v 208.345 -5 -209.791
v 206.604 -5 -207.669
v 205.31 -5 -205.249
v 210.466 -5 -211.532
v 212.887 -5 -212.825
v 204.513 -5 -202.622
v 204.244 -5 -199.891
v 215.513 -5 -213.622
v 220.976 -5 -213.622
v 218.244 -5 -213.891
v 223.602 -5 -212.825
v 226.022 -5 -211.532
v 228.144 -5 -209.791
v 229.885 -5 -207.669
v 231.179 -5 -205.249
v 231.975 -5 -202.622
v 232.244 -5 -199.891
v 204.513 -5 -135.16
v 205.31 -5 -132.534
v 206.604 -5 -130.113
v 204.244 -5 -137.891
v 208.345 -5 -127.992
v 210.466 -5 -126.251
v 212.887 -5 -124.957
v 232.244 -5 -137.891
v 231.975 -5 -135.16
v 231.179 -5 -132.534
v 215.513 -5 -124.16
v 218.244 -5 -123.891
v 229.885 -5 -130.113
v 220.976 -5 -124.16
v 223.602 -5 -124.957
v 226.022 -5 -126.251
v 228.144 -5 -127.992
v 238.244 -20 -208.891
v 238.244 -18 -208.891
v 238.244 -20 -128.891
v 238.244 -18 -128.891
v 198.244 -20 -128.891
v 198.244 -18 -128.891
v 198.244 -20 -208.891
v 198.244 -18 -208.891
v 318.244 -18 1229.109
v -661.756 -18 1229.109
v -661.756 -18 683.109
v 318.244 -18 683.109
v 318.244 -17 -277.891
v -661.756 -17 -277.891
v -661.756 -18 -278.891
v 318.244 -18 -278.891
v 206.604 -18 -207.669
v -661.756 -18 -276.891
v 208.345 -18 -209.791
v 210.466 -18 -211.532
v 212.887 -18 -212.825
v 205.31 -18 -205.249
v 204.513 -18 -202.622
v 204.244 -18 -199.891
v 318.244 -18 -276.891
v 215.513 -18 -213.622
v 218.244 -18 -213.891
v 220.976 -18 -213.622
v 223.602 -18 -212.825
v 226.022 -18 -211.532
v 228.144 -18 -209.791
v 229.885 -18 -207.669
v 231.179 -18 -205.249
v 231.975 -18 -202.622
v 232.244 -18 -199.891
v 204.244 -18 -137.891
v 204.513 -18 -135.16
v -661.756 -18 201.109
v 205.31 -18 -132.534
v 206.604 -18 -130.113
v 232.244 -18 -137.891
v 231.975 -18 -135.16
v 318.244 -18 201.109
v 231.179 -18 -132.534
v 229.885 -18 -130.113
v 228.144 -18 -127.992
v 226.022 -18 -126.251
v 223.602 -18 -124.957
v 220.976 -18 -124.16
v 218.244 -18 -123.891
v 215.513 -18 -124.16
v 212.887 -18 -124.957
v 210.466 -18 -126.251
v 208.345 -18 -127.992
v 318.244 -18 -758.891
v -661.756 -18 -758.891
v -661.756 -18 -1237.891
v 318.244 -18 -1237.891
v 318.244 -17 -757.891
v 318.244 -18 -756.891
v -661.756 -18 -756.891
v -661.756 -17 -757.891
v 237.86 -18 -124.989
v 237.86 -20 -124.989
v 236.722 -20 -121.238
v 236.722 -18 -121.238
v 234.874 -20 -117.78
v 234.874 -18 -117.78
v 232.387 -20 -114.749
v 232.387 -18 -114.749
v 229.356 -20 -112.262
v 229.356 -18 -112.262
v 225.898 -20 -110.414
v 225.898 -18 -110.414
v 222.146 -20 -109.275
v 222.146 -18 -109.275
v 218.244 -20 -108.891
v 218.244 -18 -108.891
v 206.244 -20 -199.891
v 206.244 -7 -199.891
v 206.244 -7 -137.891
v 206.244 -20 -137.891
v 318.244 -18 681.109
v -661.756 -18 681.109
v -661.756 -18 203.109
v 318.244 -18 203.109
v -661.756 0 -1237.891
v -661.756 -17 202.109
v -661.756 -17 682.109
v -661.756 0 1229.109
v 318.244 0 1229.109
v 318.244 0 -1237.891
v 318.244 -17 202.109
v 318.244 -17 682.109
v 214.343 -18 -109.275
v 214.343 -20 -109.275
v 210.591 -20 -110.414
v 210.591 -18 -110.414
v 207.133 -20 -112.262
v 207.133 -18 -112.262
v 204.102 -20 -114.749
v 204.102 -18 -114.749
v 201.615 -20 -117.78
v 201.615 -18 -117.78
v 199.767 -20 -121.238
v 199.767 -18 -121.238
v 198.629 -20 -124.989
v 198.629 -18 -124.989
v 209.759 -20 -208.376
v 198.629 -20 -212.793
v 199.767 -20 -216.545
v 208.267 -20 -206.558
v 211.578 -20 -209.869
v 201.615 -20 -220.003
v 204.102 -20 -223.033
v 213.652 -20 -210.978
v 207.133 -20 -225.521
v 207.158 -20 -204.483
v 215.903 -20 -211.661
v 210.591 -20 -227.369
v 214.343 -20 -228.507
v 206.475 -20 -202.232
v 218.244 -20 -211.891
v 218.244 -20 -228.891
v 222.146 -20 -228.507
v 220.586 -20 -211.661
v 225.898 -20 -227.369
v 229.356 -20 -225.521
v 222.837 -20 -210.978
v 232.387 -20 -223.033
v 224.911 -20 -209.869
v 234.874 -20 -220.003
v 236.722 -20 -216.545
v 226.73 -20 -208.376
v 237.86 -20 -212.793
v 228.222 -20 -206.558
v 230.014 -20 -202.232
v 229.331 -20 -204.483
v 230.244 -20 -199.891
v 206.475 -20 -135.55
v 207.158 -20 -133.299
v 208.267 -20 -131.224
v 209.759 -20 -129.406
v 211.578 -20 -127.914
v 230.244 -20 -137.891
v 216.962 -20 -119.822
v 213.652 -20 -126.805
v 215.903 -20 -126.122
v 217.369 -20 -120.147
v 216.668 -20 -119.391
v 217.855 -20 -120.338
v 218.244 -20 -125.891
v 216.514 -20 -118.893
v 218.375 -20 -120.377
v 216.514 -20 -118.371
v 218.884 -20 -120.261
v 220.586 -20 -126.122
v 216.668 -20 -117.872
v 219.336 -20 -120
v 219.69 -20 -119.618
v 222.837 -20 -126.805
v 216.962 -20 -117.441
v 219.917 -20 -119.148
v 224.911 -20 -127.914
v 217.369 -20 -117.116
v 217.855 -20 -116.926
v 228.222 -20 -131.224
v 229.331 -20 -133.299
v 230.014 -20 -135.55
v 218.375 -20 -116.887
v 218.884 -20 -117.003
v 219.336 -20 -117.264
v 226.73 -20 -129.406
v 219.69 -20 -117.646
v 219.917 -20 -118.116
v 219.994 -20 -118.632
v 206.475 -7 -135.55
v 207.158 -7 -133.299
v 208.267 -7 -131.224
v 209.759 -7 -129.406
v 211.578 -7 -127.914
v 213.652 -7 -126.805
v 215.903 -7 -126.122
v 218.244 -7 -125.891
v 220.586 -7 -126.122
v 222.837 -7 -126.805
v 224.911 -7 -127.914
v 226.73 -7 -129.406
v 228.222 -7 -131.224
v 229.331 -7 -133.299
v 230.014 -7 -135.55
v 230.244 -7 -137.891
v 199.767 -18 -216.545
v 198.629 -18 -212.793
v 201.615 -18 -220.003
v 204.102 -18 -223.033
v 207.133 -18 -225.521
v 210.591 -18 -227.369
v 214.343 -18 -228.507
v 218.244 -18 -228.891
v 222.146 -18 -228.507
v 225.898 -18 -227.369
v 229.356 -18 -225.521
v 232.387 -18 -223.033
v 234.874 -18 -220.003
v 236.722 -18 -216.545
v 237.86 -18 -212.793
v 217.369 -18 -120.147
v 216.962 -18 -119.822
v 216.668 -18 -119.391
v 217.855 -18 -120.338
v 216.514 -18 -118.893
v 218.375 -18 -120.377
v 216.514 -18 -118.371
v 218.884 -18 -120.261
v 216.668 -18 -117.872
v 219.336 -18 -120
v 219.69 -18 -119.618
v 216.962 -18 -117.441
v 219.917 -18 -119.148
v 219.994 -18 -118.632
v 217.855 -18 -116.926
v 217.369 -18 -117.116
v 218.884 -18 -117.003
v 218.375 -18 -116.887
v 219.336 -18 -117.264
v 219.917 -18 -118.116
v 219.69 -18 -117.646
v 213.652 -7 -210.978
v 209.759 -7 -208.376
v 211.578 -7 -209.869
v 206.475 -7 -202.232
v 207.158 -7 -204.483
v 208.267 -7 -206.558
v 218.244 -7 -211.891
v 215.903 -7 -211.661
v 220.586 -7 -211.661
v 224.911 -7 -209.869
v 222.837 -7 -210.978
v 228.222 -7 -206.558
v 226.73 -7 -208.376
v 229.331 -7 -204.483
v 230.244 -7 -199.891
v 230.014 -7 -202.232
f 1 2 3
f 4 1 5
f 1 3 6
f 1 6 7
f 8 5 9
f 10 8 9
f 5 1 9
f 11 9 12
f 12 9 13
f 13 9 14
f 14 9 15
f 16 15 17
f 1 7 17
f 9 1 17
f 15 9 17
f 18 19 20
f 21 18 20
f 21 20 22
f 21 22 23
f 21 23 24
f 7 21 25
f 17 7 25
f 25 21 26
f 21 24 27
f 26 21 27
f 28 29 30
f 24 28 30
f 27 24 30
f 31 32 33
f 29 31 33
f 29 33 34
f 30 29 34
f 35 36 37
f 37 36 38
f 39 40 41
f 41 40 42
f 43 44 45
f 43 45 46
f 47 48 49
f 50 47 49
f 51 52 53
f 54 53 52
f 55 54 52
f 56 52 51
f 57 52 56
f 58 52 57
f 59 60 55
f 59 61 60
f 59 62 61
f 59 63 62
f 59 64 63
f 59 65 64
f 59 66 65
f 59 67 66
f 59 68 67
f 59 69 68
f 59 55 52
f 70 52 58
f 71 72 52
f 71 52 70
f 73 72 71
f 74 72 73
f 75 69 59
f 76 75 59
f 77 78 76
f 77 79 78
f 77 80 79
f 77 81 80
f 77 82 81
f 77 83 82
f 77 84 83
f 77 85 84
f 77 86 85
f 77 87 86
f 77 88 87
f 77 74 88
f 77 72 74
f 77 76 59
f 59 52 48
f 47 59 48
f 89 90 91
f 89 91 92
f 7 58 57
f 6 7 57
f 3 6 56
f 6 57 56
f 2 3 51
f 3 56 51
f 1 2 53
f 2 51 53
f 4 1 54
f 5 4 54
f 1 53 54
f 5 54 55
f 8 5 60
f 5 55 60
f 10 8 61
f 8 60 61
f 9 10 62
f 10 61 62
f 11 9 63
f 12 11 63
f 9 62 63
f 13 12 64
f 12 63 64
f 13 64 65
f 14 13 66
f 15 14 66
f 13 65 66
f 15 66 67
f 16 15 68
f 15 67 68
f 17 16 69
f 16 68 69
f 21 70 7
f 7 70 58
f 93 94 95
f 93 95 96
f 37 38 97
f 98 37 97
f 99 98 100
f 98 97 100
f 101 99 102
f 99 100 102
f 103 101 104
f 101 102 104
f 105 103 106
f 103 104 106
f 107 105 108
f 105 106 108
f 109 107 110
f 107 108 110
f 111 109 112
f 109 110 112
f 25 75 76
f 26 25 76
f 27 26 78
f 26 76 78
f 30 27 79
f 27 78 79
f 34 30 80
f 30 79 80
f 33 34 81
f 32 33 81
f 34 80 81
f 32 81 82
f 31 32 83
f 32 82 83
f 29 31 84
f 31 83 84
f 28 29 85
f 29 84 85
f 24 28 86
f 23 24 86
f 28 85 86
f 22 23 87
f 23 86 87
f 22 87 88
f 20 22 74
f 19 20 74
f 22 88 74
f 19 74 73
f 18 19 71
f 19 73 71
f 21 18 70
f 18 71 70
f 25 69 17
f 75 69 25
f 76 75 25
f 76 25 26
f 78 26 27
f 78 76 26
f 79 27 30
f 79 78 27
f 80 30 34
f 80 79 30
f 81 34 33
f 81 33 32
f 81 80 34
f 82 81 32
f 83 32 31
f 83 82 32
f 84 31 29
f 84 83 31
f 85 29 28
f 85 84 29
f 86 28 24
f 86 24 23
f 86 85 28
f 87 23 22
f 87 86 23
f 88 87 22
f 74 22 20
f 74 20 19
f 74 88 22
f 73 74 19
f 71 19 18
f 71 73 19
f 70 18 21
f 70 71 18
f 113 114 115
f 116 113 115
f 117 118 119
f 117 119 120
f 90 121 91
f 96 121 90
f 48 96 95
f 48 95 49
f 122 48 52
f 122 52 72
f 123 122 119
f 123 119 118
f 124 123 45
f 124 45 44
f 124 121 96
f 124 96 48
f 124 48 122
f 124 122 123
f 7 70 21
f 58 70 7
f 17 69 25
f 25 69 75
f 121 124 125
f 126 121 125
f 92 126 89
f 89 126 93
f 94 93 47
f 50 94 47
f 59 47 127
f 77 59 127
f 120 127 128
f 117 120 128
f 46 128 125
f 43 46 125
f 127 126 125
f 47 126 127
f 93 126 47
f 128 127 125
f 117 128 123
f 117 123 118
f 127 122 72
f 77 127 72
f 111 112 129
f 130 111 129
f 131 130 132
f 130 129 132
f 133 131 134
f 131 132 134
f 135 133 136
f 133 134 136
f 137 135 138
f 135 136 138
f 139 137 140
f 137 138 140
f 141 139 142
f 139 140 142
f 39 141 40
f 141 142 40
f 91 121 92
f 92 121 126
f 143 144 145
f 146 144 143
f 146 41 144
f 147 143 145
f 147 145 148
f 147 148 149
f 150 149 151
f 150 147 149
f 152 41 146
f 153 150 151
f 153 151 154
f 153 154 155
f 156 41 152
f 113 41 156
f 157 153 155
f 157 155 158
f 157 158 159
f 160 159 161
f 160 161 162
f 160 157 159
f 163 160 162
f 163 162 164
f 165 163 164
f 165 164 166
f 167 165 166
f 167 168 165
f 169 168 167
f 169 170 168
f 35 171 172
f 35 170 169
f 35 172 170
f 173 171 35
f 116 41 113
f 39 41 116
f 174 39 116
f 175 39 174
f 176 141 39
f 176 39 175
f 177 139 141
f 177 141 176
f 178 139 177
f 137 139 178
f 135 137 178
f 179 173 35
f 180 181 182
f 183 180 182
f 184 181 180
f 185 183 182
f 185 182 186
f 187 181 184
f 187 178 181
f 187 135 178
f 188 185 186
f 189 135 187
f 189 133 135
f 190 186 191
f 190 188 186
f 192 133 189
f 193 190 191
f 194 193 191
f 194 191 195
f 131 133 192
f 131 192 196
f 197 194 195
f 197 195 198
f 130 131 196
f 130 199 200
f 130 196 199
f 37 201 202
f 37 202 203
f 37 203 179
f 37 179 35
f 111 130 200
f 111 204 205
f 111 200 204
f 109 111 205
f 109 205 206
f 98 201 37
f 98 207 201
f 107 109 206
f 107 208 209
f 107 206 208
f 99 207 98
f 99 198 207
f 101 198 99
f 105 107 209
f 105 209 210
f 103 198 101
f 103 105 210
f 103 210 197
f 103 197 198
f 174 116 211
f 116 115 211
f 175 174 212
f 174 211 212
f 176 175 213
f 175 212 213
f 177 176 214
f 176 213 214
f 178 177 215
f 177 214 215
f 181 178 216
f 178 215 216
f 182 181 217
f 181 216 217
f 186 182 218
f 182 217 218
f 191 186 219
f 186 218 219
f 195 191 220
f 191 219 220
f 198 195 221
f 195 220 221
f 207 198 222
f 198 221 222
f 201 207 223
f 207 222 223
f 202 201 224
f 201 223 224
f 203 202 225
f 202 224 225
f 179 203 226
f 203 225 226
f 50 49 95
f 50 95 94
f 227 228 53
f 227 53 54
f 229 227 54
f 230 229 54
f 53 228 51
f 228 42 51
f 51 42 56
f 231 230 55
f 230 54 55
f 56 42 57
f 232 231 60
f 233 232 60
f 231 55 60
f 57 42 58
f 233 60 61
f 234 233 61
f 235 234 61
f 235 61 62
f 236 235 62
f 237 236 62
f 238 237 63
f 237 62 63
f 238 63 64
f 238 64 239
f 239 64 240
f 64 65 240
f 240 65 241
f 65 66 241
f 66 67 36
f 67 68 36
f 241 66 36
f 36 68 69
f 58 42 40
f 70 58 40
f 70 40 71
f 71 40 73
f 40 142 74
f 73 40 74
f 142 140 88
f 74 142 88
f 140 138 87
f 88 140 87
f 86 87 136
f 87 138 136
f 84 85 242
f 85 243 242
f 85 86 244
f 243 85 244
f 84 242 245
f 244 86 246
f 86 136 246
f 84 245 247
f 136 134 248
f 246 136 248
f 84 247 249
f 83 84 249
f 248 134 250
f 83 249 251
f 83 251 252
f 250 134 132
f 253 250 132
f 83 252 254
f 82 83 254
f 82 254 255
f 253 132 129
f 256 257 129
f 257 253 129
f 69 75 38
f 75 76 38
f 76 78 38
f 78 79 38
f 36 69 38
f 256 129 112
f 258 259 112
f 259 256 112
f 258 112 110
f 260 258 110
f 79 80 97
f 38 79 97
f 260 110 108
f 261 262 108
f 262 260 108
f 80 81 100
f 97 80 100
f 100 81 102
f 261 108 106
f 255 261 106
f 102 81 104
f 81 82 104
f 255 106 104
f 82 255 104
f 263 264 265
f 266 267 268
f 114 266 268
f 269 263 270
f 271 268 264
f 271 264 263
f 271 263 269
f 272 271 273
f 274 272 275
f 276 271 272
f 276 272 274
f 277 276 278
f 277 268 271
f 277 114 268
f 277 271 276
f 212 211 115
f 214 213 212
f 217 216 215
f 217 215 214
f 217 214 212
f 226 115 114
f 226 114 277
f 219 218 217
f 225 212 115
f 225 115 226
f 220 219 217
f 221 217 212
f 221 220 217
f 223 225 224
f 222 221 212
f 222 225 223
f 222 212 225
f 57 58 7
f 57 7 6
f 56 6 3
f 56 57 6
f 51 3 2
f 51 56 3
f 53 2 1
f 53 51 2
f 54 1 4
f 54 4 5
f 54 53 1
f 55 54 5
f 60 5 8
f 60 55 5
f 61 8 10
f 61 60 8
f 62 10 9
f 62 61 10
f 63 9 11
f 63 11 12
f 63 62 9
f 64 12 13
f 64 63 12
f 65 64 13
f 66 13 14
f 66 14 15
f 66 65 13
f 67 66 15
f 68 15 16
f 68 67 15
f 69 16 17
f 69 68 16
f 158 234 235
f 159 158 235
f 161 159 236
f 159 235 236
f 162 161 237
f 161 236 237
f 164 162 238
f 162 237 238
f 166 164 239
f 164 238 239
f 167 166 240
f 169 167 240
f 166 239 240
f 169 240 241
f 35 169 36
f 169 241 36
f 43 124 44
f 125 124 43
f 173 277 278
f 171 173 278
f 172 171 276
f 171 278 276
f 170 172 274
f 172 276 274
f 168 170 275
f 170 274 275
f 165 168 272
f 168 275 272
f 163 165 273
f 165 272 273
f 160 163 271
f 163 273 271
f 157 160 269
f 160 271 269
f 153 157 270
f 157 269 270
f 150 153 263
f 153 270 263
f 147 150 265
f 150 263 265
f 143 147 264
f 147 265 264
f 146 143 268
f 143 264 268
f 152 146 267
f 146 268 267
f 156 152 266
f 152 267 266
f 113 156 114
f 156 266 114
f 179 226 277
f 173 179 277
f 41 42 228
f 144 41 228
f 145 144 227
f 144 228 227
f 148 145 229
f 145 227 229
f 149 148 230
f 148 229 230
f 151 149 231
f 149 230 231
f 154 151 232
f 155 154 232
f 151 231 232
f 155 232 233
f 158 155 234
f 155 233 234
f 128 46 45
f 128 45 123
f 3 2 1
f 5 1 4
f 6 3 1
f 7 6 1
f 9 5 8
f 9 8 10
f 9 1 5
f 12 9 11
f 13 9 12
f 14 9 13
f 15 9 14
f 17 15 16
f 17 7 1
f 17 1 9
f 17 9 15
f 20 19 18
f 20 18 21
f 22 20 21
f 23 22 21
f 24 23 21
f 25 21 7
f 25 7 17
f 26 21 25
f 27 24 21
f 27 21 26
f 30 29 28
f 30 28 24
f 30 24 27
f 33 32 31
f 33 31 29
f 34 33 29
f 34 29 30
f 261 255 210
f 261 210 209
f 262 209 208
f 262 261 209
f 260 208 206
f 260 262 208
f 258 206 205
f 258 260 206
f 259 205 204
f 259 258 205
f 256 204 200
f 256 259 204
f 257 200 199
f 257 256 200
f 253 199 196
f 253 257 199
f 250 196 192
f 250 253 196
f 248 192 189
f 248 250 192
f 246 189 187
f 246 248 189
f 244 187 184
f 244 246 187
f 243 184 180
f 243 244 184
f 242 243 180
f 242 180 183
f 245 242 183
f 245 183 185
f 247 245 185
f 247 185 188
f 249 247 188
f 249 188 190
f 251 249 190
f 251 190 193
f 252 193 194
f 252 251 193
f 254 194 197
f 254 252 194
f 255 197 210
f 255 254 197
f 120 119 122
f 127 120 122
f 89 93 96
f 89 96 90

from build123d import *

# Parameters (mm, degrees)
F0_W     = 980
F0_H     = 2467
F1_DEPTH = 18
F3_DEPTH = 980.001
F5_DEPTH = 13
F6_DEPTH = 13
F7_START = -11
F7_DEPTH = 2
F4_R     = 1.75
F8_DEPTH = 2


with BuildPart() as f1:
    # F0 (on Front) → F1 (new body)
    with BuildSketch(Plane.XZ):
        with Locations((-171.7555719672, -4.3911735862)):
            Rectangle(F0_W, F0_H)
    extrude(amount=F1_DEPTH)

    # F2 (on face) → F3 (cut, through all)
    with BuildSketch(Plane(origin=(-661.7555719672, 0, 0), x_dir=(0, -1, 0), z_dir=(-1, 0, 0))):
        Polygon((18, -757.8911735862), (18, -756.8911735862), (17, -757.8911735862), (18, -758.8911735862), align=None)
        Polygon((18, 682.1088264138), (18, 683.1088264138), (17, 682.1088264138), (18, 681.1088264138), align=None)
        Polygon((17, -277.8911735862), (18, -278.8911735862), (18, -277.8911735862), (18, -276.8911735862), align=None)
        Polygon((17, 202.1088264138), (18, 201.1088264138), (18, 202.1088264138), (18, 203.1088264138), align=None)
    extrude(amount=-F3_DEPTH, mode=Mode.SUBTRACT)

    # F4 (on face) → F5 (cut)
    with BuildSketch(Plane.XZ.offset(18)):
        with BuildLine():
            Line((232.2444280328, -199.8911735862), (232.2444280328, -137.8911735862))
            ThreePointArc((232.2444280328, -137.8911735862), (218.2444280328, -123.8911735862), (204.2444280328, -137.8911735862))
            Line((204.2444280328, -137.8911735862), (204.2444280328, -199.8911735862))
            ThreePointArc((204.2444280328, -199.8911735862), (218.2444280328, -213.8911735862), (232.2444280328, -199.8911735862))
        make_face()
        with BuildLine():
            ThreePointArc((206.2444280328, -137.8911735862), (218.2444280328, -125.8911735862), (230.2444280328, -137.8911735862))
            Line((230.2444280328, -137.8911735862), (230.2444280328, -199.8911735862))
            ThreePointArc((230.2444280328, -199.8911735862), (218.2444280328, -211.8911735862), (206.2444280328, -199.8911735862))
            Line((206.2444280328, -199.8911735862), (206.2444280328, -137.8911735862))
        make_face(mode=Mode.SUBTRACT)
        with BuildLine():
            Line((230.2444280328, -199.8911735862), (230.2444280328, -137.8911735862))
            ThreePointArc((230.2444280328, -137.8911735862), (218.2444280328, -125.8911735862), (206.2444280328, -137.8911735862))
            Line((206.2444280328, -137.8911735862), (206.2444280328, -199.8911735862))
            ThreePointArc((206.2444280328, -199.8911735862), (218.2444280328, -211.8911735862), (230.2444280328, -199.8911735862))
        make_face()
    extrude(amount=-F5_DEPTH, mode=Mode.SUBTRACT)


with BuildPart() as f6:
    # F4 (on face) → F6 (new body)
    with BuildSketch(Plane.XZ.offset(18)):
        with BuildLine():
            Line((232.2444280328, -199.8911735862), (232.2444280328, -137.8911735862))
            ThreePointArc((232.2444280328, -137.8911735862), (218.2444280328, -123.8911735862), (204.2444280328, -137.8911735862))
            Line((204.2444280328, -137.8911735862), (204.2444280328, -199.8911735862))
            ThreePointArc((204.2444280328, -199.8911735862), (218.2444280328, -213.8911735862), (232.2444280328, -199.8911735862))
        make_face()
        with BuildLine():
            ThreePointArc((206.2444280328, -137.8911735862), (218.2444280328, -125.8911735862), (230.2444280328, -137.8911735862))
            Line((230.2444280328, -137.8911735862), (230.2444280328, -199.8911735862))
            ThreePointArc((230.2444280328, -199.8911735862), (218.2444280328, -211.8911735862), (206.2444280328, -199.8911735862))
            Line((206.2444280328, -199.8911735862), (206.2444280328, -137.8911735862))
        make_face(mode=Mode.SUBTRACT)
    extrude(amount=-F6_DEPTH)

    # F4 (on face) → F7 (join)
    with BuildSketch(Plane.XZ.offset(18).offset(F7_START)):
        with BuildLine():
            Line((232.2444280328, -199.8911735862), (232.2444280328, -137.8911735862))
            ThreePointArc((232.2444280328, -137.8911735862), (218.2444280328, -123.8911735862), (204.2444280328, -137.8911735862))
            Line((204.2444280328, -137.8911735862), (204.2444280328, -199.8911735862))
            ThreePointArc((204.2444280328, -199.8911735862), (218.2444280328, -213.8911735862), (232.2444280328, -199.8911735862))
        make_face()
        with BuildLine():
            ThreePointArc((206.2444280328, -137.8911735862), (218.2444280328, -125.8911735862), (230.2444280328, -137.8911735862))
            Line((230.2444280328, -137.8911735862), (230.2444280328, -199.8911735862))
            ThreePointArc((230.2444280328, -199.8911735862), (218.2444280328, -211.8911735862), (206.2444280328, -199.8911735862))
            Line((206.2444280328, -199.8911735862), (206.2444280328, -137.8911735862))
        make_face(mode=Mode.SUBTRACT)
        with BuildLine():
            Line((230.2444280328, -199.8911735862), (230.2444280328, -137.8911735862))
            ThreePointArc((230.2444280328, -137.8911735862), (218.2444280328, -125.8911735862), (206.2444280328, -137.8911735862))
            Line((206.2444280328, -137.8911735862), (206.2444280328, -199.8911735862))
            ThreePointArc((206.2444280328, -199.8911735862), (218.2444280328, -211.8911735862), (230.2444280328, -199.8911735862))
        make_face()
    extrude(amount=-F7_DEPTH)

    # F4 (on face) → F8 (join)
    with BuildSketch(Plane.XZ.offset(18)):
        with BuildLine():
            ThreePointArc((238.2444280328, -128.8911735862), (232.3865636565, -114.7490379625), (218.2444280328, -108.8911735862))
            ThreePointArc((218.2444280328, -108.8911735862), (204.1022924091, -114.7490379625), (198.2444280328, -128.8911735862))
            Line((198.2444280328, -128.8911735862), (198.2444280328, -168.8911735862))
            Line((198.2444280328, -168.8911735862), (198.2444280328, -208.8911735862))
            ThreePointArc((198.2444280328, -208.8911735862), (204.1022924091, -223.03330921), (218.2444280328, -228.8911735862))
            ThreePointArc((218.2444280328, -228.8911735862), (232.3865636565, -223.03330921), (238.2444280328, -208.8911735862))
            Line((238.2444280328, -208.8911735862), (238.2444280328, -168.8911735862))
            Line((238.2444280328, -168.8911735862), (238.2444280328, -128.8911735862))
        make_face()
        with BuildLine():
            ThreePointArc((204.2444280328, -137.8911735862), (218.2444280328, -123.8911735862), (232.2444280328, -137.8911735862))
            Line((232.2444280328, -137.8911735862), (232.2444280328, -199.8911735862))
            ThreePointArc((232.2444280328, -199.8911735862), (218.2444280328, -213.8911735862), (204.2444280328, -199.8911735862))
            Line((204.2444280328, -199.8911735862), (204.2444280328, -137.8911735862))
        make_face(mode=Mode.SUBTRACT)
        with Locations((218.2444280328, -118.6317622662)):
            Circle(F4_R, mode=Mode.SUBTRACT)
        with BuildLine():
            Line((232.2444280328, -199.8911735862), (232.2444280328, -137.8911735862))
            ThreePointArc((232.2444280328, -137.8911735862), (218.2444280328, -123.8911735862), (204.2444280328, -137.8911735862))
            Line((204.2444280328, -137.8911735862), (204.2444280328, -199.8911735862))
            ThreePointArc((204.2444280328, -199.8911735862), (218.2444280328, -213.8911735862), (232.2444280328, -199.8911735862))
        make_face()
        with BuildLine():
            ThreePointArc((206.2444280328, -137.8911735862), (218.2444280328, -125.8911735862), (230.2444280328, -137.8911735862))
            Line((230.2444280328, -137.8911735862), (230.2444280328, -199.8911735862))
            ThreePointArc((230.2444280328, -199.8911735862), (218.2444280328, -211.8911735862), (206.2444280328, -199.8911735862))
            Line((206.2444280328, -199.8911735862), (206.2444280328, -137.8911735862))
        make_face(mode=Mode.SUBTRACT)
    extrude(amount=F8_DEPTH)


solid = Compound([f1.part, f6.part])
